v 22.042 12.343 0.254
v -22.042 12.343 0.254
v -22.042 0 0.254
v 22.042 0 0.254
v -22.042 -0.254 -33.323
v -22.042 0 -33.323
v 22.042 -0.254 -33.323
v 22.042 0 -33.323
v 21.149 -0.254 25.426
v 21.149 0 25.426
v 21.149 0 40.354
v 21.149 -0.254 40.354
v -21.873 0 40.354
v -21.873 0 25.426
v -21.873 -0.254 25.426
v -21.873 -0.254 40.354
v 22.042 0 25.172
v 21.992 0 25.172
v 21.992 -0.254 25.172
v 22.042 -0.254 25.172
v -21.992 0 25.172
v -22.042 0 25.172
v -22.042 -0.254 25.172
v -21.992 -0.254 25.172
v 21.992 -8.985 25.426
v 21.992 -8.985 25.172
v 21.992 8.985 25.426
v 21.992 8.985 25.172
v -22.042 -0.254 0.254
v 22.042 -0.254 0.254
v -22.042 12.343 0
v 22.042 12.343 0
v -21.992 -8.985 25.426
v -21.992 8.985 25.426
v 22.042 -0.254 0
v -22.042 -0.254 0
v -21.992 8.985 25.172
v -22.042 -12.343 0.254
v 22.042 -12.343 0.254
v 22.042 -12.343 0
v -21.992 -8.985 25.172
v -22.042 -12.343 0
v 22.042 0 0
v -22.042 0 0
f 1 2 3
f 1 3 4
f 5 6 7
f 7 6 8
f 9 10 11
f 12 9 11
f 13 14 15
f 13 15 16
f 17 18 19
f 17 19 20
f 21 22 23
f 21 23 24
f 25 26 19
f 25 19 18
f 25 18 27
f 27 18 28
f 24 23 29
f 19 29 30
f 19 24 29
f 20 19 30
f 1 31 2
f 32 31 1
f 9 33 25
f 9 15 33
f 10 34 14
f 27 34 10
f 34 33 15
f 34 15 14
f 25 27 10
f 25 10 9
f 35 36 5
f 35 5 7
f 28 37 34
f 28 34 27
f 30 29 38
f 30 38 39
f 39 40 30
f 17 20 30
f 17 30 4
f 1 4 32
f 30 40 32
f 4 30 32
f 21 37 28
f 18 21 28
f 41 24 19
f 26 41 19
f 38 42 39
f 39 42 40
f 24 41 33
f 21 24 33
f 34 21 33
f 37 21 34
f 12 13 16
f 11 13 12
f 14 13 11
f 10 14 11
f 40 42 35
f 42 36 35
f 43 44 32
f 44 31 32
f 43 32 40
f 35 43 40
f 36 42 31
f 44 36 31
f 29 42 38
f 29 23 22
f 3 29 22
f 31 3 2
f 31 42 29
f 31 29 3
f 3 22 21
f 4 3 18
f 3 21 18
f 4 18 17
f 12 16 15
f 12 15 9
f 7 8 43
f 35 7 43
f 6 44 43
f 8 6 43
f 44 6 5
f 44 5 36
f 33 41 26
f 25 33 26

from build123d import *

# Parameters (mm, degrees)
F0_W     = 44.083602
F0_H     = 33.323038
F1_DEPTH = 0.254
F2_W     = 44.083606
F2_H     = 24.686816
F3_DEPTH = 0.254
F4_W     = 44.083606
F4_H     = 25.171924
F5_DEPTH = 0.254
F6_W     = 43.984536
F6_H     = 17.969414
F7_DEPTH = 0.254
F8_W     = 43.022267
F8_H     = 15.82749
F9_DEPTH = 0.254


with BuildPart() as f1:
    # F0 (on Front) → F1 (new body)
    with BuildSketch(Plane.XZ):
        with Locations((0, -16.661519)):
            Rectangle(F0_W, F0_H)
    extrude(amount=F1_DEPTH)

    # F2 (on face) → F3 (join)
    with BuildSketch(Plane.XY):
        Rectangle(F2_W, F2_H)
    extrude(amount=F3_DEPTH)

    # F4 (on Front) → F5 (join)
    with BuildSketch(Plane.XZ):
        with Locations((0, 12.585962)):
            Rectangle(F4_W, F4_H)
    extrude(amount=F5_DEPTH)

    # F6 (on face) → F7 (join)
    with BuildSketch(Plane.XY.offset(25.171924)):
        Rectangle(F6_W, F6_H)
    extrude(amount=F7_DEPTH)

    # F8 (on Front) → F9 (join)
    with BuildSketch(Plane.XZ):
        with Locations((-0.362341, 32.440369)):
            Rectangle(F8_W, F8_H)
    extrude(amount=F9_DEPTH)


solid = f1.part
